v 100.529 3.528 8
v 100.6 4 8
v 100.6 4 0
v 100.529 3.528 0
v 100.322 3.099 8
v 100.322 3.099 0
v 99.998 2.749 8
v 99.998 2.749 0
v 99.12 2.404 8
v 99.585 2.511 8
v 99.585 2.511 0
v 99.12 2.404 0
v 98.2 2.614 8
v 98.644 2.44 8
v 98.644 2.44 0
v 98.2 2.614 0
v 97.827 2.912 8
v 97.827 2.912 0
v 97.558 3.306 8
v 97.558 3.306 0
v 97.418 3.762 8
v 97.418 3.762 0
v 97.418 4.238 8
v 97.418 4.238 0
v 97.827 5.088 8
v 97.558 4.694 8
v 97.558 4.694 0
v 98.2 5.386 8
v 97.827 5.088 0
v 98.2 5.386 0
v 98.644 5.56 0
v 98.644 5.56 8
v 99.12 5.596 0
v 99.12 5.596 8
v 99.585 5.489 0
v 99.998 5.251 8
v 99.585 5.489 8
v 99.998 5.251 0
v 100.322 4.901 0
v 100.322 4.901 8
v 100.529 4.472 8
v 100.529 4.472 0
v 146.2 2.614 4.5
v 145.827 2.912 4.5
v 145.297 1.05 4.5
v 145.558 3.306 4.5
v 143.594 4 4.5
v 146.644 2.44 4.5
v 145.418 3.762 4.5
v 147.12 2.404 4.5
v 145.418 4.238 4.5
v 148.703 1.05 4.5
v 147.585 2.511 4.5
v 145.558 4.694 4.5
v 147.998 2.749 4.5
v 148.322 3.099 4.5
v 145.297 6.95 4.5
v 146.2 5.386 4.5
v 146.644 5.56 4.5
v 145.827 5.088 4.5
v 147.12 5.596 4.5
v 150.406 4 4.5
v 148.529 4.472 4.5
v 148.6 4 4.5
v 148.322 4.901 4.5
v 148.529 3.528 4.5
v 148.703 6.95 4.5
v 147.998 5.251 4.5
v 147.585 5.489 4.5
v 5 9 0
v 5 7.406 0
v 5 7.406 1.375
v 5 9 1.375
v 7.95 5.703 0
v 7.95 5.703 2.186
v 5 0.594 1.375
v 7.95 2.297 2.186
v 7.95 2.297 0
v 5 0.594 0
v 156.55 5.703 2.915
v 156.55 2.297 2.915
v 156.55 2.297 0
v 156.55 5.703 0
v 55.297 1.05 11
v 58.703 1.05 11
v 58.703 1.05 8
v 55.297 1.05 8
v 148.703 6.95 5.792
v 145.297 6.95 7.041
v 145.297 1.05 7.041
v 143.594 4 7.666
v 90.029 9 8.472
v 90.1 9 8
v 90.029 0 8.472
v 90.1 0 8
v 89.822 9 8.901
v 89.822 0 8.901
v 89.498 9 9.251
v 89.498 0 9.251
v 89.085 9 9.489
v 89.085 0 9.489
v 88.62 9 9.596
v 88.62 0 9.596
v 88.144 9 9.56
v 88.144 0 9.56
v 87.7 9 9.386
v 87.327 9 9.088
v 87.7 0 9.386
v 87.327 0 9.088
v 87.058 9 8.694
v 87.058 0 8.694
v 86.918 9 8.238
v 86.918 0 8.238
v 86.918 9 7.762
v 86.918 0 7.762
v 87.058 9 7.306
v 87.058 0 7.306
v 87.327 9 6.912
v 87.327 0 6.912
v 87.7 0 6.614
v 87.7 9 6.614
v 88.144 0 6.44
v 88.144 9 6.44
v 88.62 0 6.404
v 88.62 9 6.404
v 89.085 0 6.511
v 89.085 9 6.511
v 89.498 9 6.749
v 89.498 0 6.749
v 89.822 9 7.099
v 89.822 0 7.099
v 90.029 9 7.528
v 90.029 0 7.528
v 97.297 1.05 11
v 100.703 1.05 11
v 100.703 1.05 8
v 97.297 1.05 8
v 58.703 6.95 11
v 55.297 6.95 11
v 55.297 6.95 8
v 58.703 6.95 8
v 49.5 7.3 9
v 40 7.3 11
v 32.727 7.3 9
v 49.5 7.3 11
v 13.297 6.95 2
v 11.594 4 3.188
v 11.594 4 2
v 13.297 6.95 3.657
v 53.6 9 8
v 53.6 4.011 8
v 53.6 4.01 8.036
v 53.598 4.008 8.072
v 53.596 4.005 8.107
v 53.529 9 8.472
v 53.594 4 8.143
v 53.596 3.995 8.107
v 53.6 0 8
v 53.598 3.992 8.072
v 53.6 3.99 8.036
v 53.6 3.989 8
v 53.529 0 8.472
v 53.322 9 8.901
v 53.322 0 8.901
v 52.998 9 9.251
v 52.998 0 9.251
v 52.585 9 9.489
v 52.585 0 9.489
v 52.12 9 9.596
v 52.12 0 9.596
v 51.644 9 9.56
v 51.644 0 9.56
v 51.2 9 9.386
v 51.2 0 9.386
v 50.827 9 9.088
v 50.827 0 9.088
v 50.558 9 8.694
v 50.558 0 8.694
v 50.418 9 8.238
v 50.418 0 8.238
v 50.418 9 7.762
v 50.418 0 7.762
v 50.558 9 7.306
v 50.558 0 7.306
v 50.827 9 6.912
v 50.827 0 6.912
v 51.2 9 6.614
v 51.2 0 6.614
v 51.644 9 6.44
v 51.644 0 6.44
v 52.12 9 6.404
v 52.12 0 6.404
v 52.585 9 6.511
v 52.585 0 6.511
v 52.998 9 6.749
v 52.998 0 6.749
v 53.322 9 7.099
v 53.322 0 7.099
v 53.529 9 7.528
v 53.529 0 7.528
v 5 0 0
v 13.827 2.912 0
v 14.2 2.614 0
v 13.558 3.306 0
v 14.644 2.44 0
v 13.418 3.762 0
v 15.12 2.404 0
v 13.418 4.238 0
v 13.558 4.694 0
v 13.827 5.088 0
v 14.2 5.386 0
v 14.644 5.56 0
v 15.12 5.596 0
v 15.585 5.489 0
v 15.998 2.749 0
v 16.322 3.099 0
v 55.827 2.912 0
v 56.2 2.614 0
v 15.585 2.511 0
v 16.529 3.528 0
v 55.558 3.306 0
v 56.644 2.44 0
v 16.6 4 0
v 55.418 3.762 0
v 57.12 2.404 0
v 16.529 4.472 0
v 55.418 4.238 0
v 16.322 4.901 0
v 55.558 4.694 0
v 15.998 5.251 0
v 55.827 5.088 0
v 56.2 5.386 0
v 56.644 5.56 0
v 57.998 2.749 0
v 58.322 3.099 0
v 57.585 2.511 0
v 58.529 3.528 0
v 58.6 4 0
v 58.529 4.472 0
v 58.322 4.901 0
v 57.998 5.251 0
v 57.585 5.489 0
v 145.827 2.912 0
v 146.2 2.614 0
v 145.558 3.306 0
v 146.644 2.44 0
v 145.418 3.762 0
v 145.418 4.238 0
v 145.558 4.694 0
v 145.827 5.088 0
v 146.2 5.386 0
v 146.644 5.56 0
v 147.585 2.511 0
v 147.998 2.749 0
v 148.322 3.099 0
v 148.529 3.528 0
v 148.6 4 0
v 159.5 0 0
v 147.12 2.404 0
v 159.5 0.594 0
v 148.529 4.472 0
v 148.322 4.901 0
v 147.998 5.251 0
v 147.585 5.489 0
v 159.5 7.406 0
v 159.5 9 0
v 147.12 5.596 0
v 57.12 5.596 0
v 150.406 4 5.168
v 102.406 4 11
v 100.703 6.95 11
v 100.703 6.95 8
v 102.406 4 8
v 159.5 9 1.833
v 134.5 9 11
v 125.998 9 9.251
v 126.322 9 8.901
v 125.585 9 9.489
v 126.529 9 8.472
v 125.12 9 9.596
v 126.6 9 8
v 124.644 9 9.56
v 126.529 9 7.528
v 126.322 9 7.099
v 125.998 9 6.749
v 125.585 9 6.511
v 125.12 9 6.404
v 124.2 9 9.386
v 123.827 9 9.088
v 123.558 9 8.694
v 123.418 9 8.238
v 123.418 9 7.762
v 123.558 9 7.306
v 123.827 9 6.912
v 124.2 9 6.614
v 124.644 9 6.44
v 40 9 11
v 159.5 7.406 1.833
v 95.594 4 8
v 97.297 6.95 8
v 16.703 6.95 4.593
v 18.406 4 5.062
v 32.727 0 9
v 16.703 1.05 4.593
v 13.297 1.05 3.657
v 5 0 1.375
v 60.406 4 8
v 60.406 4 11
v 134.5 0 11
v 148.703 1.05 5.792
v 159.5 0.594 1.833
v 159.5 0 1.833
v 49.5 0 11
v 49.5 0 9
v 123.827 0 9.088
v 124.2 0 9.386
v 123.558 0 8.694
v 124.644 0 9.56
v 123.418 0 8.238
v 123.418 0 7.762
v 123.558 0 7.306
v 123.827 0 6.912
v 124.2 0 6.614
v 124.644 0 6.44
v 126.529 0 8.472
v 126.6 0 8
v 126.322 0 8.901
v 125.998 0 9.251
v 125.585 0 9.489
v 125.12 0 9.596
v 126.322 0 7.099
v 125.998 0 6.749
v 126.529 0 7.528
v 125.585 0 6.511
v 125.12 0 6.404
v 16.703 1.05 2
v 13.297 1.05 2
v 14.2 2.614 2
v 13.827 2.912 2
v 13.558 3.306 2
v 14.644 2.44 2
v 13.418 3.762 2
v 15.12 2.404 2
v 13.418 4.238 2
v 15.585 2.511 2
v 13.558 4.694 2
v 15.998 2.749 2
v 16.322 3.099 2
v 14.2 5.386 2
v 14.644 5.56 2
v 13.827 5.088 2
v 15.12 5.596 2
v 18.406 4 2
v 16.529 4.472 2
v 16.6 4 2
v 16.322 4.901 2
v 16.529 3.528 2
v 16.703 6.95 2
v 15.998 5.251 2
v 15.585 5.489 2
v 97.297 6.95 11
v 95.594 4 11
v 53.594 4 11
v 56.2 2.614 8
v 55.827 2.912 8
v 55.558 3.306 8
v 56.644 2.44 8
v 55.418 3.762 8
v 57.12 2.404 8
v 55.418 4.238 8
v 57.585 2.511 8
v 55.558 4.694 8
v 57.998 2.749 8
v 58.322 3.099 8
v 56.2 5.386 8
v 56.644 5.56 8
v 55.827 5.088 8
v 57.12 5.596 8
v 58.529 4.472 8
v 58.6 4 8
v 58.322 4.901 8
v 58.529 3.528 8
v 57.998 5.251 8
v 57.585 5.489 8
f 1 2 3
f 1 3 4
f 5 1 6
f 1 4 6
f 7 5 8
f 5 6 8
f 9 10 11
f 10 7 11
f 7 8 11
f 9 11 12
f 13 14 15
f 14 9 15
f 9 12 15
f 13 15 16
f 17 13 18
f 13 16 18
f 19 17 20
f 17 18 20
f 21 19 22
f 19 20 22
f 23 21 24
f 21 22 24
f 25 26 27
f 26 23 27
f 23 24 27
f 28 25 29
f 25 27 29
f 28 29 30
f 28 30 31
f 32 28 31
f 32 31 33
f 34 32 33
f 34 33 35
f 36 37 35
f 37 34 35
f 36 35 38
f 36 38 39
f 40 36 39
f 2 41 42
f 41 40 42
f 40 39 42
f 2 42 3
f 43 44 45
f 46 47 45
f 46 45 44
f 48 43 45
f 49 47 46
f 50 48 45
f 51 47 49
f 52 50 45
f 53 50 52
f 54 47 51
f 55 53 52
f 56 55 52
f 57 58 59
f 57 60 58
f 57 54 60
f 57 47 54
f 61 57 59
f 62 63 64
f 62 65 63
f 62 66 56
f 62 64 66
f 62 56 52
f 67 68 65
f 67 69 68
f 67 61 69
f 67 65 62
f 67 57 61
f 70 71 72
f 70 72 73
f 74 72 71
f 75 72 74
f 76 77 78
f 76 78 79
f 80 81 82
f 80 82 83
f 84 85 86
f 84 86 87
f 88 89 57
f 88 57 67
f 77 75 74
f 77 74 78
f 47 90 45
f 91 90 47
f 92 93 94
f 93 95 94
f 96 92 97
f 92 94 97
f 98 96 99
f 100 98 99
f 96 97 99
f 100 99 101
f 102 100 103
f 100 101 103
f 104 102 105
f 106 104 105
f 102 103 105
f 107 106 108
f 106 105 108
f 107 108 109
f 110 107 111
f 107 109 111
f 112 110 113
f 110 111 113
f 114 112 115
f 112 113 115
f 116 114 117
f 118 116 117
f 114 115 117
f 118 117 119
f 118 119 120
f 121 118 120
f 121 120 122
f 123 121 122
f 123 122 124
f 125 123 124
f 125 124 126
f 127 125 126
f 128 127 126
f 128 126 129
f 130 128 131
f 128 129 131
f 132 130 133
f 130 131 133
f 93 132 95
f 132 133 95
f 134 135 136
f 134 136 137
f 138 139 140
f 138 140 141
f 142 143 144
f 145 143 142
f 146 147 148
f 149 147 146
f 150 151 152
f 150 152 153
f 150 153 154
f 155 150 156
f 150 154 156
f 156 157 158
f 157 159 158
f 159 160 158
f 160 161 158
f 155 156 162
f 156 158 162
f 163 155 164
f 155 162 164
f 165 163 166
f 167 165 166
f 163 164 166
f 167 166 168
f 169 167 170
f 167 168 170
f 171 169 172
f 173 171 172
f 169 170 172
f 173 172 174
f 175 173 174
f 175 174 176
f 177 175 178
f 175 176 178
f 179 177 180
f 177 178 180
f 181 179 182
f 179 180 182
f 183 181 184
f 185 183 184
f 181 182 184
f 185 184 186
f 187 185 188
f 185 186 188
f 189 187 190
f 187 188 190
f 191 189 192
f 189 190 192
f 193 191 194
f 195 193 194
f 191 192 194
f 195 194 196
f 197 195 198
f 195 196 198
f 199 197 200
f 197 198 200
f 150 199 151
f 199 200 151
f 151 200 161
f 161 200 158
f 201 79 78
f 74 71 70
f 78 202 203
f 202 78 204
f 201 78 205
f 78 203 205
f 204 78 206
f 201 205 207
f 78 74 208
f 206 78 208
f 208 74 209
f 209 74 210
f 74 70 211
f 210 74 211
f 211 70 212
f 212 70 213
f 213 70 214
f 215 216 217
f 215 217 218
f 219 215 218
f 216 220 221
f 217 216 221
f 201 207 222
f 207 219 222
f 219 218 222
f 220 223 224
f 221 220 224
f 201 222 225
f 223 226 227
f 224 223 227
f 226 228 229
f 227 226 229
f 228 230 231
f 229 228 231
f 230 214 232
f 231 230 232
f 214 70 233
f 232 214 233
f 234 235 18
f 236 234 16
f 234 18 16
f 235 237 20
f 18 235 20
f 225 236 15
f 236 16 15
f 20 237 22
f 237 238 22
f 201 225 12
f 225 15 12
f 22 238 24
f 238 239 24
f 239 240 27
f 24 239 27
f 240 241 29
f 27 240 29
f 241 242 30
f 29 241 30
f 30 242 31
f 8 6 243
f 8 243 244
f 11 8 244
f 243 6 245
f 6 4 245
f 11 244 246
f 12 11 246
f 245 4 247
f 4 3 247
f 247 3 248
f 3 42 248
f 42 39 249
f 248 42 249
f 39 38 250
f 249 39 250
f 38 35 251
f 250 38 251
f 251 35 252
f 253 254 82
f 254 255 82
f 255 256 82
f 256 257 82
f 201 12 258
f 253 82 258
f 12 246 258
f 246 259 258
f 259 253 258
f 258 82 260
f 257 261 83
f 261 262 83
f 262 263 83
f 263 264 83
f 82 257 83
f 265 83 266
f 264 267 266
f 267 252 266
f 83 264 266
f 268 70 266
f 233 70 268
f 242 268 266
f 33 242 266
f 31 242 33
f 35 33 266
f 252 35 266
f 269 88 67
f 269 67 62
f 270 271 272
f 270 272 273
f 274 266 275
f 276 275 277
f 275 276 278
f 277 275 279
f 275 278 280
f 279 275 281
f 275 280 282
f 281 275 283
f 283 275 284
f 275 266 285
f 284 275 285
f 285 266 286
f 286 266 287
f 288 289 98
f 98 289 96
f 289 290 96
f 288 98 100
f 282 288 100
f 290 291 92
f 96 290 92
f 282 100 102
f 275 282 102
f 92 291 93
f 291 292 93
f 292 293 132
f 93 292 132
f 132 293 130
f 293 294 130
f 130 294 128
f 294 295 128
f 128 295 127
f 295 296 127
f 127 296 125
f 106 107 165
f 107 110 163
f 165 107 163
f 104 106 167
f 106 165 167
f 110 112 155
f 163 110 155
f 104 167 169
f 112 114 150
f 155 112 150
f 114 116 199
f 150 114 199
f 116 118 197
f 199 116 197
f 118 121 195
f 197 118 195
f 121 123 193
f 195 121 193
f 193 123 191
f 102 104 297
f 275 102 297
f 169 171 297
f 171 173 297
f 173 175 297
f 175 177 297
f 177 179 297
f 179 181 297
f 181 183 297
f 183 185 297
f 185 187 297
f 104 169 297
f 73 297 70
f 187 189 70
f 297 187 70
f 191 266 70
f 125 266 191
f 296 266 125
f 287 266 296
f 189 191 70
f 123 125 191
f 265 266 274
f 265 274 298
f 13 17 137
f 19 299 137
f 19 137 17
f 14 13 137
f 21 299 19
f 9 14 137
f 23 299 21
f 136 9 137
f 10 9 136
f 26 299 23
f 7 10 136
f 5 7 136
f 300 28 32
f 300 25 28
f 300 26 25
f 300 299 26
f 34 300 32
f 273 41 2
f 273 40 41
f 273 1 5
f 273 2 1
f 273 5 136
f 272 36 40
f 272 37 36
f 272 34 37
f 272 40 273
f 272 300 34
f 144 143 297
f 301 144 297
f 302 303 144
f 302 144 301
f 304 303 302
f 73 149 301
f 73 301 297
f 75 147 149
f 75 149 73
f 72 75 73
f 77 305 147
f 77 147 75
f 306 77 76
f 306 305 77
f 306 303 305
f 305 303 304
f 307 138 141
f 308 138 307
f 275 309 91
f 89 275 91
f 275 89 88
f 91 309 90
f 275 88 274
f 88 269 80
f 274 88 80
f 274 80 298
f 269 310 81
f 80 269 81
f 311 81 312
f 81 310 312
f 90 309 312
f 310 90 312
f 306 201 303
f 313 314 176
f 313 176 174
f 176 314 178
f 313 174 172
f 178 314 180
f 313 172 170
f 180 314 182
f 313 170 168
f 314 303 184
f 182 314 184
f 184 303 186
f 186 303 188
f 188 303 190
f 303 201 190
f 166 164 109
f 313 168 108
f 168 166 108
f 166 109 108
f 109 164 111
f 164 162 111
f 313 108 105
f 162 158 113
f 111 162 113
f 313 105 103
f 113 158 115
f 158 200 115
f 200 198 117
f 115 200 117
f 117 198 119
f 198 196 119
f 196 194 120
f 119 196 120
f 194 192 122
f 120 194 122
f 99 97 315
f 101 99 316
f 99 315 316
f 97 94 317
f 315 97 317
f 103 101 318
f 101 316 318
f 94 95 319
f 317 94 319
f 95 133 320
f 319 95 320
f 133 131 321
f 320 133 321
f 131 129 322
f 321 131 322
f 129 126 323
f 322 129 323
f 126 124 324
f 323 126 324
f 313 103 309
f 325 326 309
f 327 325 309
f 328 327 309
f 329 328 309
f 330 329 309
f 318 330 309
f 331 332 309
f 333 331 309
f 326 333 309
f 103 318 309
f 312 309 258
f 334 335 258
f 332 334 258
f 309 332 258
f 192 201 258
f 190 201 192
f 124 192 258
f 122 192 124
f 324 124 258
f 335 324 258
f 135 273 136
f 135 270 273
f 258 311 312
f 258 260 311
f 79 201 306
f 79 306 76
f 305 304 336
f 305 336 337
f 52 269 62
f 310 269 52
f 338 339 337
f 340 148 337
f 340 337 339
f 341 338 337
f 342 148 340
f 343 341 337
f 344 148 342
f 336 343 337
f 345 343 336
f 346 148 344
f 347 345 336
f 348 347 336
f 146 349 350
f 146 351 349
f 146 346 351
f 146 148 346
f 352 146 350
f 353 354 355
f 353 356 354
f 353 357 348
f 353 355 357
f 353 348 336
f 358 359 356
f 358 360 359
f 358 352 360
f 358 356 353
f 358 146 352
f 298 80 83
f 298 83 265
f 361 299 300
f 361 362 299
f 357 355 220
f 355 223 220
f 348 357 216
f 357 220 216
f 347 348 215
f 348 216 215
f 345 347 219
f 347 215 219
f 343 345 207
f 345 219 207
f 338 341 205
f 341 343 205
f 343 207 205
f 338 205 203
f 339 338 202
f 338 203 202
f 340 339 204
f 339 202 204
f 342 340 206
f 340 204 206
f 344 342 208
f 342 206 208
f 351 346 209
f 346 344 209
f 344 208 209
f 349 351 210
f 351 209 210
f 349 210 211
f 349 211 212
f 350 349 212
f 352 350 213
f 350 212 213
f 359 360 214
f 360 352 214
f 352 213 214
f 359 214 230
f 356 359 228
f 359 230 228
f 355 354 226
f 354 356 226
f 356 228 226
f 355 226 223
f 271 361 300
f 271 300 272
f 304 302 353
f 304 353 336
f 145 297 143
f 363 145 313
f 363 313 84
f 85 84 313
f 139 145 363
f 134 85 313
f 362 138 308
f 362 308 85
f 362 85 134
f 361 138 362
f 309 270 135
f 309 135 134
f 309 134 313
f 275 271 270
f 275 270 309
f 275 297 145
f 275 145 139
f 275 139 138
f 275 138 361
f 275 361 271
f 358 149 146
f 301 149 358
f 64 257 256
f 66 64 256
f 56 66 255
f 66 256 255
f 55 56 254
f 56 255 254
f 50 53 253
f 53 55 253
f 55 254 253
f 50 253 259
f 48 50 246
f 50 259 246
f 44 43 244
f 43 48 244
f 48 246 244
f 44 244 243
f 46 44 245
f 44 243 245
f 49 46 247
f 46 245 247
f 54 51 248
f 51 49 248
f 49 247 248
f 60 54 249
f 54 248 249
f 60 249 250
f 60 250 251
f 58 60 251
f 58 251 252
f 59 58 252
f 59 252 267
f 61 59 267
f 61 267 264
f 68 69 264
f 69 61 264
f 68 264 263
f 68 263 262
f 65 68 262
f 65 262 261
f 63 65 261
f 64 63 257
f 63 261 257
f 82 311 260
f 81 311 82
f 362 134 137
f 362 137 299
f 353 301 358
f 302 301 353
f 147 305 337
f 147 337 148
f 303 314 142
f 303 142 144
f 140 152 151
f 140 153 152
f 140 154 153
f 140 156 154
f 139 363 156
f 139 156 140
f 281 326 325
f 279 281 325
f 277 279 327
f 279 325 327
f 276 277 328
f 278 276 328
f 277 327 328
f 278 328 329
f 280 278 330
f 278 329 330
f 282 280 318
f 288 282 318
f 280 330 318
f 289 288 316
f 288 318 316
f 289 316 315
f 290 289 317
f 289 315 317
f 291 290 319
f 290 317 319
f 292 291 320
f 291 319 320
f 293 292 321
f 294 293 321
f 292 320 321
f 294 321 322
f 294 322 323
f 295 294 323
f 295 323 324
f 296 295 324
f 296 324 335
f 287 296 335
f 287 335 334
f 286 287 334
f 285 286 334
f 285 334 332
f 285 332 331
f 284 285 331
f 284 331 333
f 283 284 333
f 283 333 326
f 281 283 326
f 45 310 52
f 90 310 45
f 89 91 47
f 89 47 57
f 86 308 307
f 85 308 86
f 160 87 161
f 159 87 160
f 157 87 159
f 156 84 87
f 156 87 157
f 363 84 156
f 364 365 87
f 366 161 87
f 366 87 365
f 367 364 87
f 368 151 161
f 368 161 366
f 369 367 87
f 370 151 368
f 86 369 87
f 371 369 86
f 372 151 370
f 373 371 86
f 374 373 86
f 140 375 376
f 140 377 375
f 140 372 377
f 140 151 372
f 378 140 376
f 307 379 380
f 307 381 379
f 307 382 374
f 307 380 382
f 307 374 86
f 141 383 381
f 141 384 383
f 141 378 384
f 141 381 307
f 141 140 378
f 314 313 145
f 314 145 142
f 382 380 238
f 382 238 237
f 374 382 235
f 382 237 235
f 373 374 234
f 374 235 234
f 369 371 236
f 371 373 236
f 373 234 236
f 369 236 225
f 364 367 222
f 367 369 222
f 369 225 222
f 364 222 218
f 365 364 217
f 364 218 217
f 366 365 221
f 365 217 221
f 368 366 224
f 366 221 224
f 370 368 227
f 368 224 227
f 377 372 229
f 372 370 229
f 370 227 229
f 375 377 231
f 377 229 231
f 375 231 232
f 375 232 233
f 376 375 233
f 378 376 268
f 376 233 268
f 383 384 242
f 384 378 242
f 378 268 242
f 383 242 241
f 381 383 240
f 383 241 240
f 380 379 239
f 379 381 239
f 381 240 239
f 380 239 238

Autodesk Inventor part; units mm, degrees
ref_plane "YZ Plane" through (0, 0, 0) normal (1, 0, 0) x (0, 1, 0)
ref_plane "XZ Plane" through (0, 0, 0) normal (0, 1, 0) x (-1, 0, 0)
ref_plane "XY Plane" through (0, 0, 0) normal (0, 0, 1) x (1, 0, 0)
sketch "Sketch1" plane through (0, 0, 0) normal (0, 0, 1) x (1, 0, 0)
  line L0 (0, 0) -> (164.5, 0)
  line L1 (164.5, 0) -> (164.5, 9)
  line L2 (164.5, 9) -> (0, 9)
  line L3 (0, 9) -> (0, 0)
  circle A0 centre (57, 4) radius 1.6
  circle A1 centre (99, 4) radius 1.6
  circle A2 centre (159.5, 4) radius 1.6
  circle A3 centre (147, 4) radius 1.6
  circle A4 centre (15, 4) radius 1.6
  circle A5 centre (5, 4) radius 1.6
  dimension "d1" = 9
  dimension "d2" = 90
  dimension "d4" = 3.2
  dimension "d6" = 3.2
  dimension "d7" = 3.2
  dimension "d8" = 42
  dimension "d9" = 60.5
  dimension "d26" = 3.2
  dimension "d27" = 48
  dimension "d28" = 3.2
  dimension "d29" = 42
  dimension "d32" = 15
  dimension "d33" = 5
  dimension "d61" = 3.2
  dimension "d62" = 10
  dimension "d63" = 12.5
  dimension "d108" = 4
  dimension "d109" = 4
  dimension "d110" = 4
  dimension "d111" = 4
  dimension "d112" = 4
  dimension "d113" = 4
ref_plane "Work Plane2" through (0, 0, 0) normal (0, -1, 0) x (1, 0, 0)
sketch "Sketch2" plane through (0, 0, 0) normal (0, -1, 0) x (1, 0, 0)
  circle A0 centre (52, 8) radius 1.6
  circle A1 centre (125, 8) radius 1.6
  circle A2 centre (88.5, 8) radius 1.6
  point P0 (0, 0)
  point P1 (52, 0)
  dimension "d13" = 3.2
  dimension "d15" = 3.2
  dimension "d17" = 3.2
  dimension "d18" = 36.5
  dimension "d64" = 52
  dimension "d65" = 36.5
  dimension "d114" = 8
  dimension "d115" = 73
ref_plane "Work Plane1" through (0, 0, 11) normal (0, 0, 1) x (1, 0, 0)
extrude "klocek" add sketch "Sketch1" along normal blind 11
ref_plane "Work Plane3" through (0, 0, 0) normal (0, -1, 0) x (1, 0, 0)
extrude "prowadzenie osi" cut sketch "Sketch2" against normal up to next
ref_plane "Work Plane4" through (0, 0, 0) normal (0, -1, 0) x (1, 0, 0)
sketch "Sketch7" plane through (0, 0, 0) normal (0, -1, 0) x (1, 0, 0)
  line L0 (0, 11) -> (0, 0)
  line L1 (0, 11) -> (164.5, 11) projected
  line L2 (0, 11) -> (40, 11)
  line L3 (40, 11) -> (0, 0)
  point P0 (0, -1.8333)
  dimension "d86" = 11
  dimension "d87" = 40
sketch "Sketch8" plane through (0, 0, 0) normal (0, -1, 0) x (1, 0, 0)
  line L0 (164.5, 0) -> (164.5, 11) projected
  line L1 (164.5, 11) -> (164.5, 0)
  line L2 (164.5, 11) -> (0, 11) projected
  line L3 (164.5, 11) -> (134.5, 11)
  line L4 (134.5, 11) -> (164.5, 0)
  point P0 (0, 0)
  point P1 (40.8333, 11)
  dimension "d80" = 11
  dimension "d81" = 30
extrude "przedni skos" cut sketch "Sketch7" against normal up to next
extrude "tylni skos" cut sketch "Sketch8" against normal up to next
ref_plane "Work Plane7" through (0, 0, 11) normal (0, 0, 1) x (1, 0, 0)
sketch "Sketch5" plane through (0, 0, 11) normal (0, 0, 1) x (1, 0, 0)
  circle A0 centre (99, 4) radius 1.6 projected
  line L0 (95.5936, 4) -> (97.2968, 6.95)
  line L1 (97.2968, 6.95) -> (100.7032, 6.95)
  line L2 (100.7032, 6.95) -> (102.4064, 4)
  line L3 (102.4064, 4) -> (100.7032, 1.05)
  line L4 (100.7032, 1.05) -> (97.2968, 1.05)
  line L5 (97.2968, 1.05) -> (95.5936, 4)
  circle A1 centre (57, 4) radius 1.6 projected
  line L6 (60.4064, 4) -> (58.7032, 1.05)
  line L7 (58.7032, 1.05) -> (55.2968, 1.05)
  line L8 (55.2968, 1.05) -> (53.5936, 4)
  line L9 (53.5936, 4) -> (55.2968, 6.95)
  line L10 (55.2968, 6.95) -> (58.7032, 6.95)
  line L11 (58.7032, 6.95) -> (60.4064, 4)
  point P0 (119.5, 5)
  dimension "d98" = 5.9
  dimension "d100" = 5.9
extrude "hex insert middle" cut sketch "Sketch5" against normal blind 3
ref_plane "Work Plane6" through (0, 0, 11) normal (0, 0, 1) x (1, 0, 0)
sketch "Sketch9" plane through (0, 0, 11) normal (0, 0, 1) x (1, 0, 0)
  circle A0 centre (147, 4) radius 1.6 projected
  line L0 (150.4064, 4) -> (148.7032, 1.05)
  line L1 (148.7032, 1.05) -> (145.2968, 1.05)
  line L2 (145.2968, 1.05) -> (143.5936, 4)
  line L3 (143.5936, 4) -> (145.2968, 6.95)
  line L4 (145.2968, 6.95) -> (148.7032, 6.95)
  line L5 (148.7032, 6.95) -> (150.4064, 4)
  point P0 (0, 0)
  point P1 (153, 5)
  dimension "d99" = 5.9
extrude "hex insert rear 1" cut sketch "Sketch9" against normal blind 6.5
ref_plane "Work Plane5" through (0, 0, 11) normal (0, 0, 1) x (1, 0, 0)
sketch "Sketch10" plane through (0, 0, 11) normal (0, 0, 1) x (1, 0, 0)
  circle A0 centre (159.5, 4) radius 1.6 projected
  line L0 (162.45, 5.7032) -> (162.45, 2.2968)
  line L1 (162.45, 2.2968) -> (159.5, 0.5936)
  line L2 (159.5, 0.5936) -> (156.55, 2.2968)
  line L3 (156.55, 2.2968) -> (156.55, 5.7032)
  line L4 (156.55, 5.7032) -> (159.5, 7.4064)
  line L5 (159.5, 7.4064) -> (162.45, 5.7032)
  line L6 (164.5, 0) -> (134.5, 0) projected
  point P0 (0, 0)
  dimension "d118" = 5.9
extrude "hex insert rear 2" cut sketch "Sketch10" against normal up to next contours A0 | L0 L1 L2 L3 L4 L5
sketch "Sketch13" plane through (0, 0, 11) normal (0, 0, 1) x (1, 0, 0)
  line L0 (197.4, 0) -> (-32.9, 0) projected
  line L1 (7.95, 2.2968) -> (5, 0.5936)
  line L2 (5, 0.5936) -> (2.05, 2.2968)
  line L3 (2.05, 2.2968) -> (2.05, 5.7032)
  line L4 (2.05, 5.7032) -> (5, 7.4064)
  line L5 (5, 7.4064) -> (7.95, 5.7032)
  line L6 (7.95, 5.7032) -> (7.95, 2.2968)
  point P0 (0, 0)
  point P1 (5, 4)
  point P2 (5, 4)
  dimension "d117" = 5.9
extrude "hex insert front 1" cut sketch "Sketch13" against normal through all
sketch "Sketch16" plane through (0, 0, 11) normal (0, 0, 1) x (1, 0, 0)
  circle A0 centre (15, 4) radius 1.6 projected
  line L0 (18.4064, 4) -> (16.7032, 1.05)
  line L1 (16.7032, 1.05) -> (13.2968, 1.05)
  line L2 (13.2968, 1.05) -> (11.5936, 4)
  line L3 (11.5936, 4) -> (13.2968, 6.95)
  line L4 (13.2968, 6.95) -> (16.7032, 6.95)
  line L5 (16.7032, 6.95) -> (18.4064, 4)
  point P0 (0, 0)
  dimension "d93" = 5.9
extrude "hex insert front 2" cut sketch "Sketch16" against normal blind 9
sketch "Sketch17" plane through (0, 0, 0) normal (0, 0, -1) x (-1, 0, 0)
  line L0 (0, 9) -> (0, 0) projected
  line L1 (0, 0) -> (-5, 0)
  line L2 (-5, 0) -> (-5, 10.0042)
  line L3 (-5, 10.0042) -> (0, 10.0042)
  line L4 (0, 10.0042) -> (0, 0)
  point P0 (-5, 7.4064)
extrude "ciecie przod" cut sketch "Sketch17" against normal up to next
sketch "Sketch18" plane through (40, 0, 11) normal (0, -1, 0) x (1, 0, 0)
  line L0 (9.5, 0) -> (9.5, -2)
  line L1 (9.5, -2) -> (-7.5, -2)
  line L2 (-7.5, -2) -> (-7.5, 0)
  line L3 (-7.5, 0) -> (9.5, 0)
  line L4 (94.5, 0) -> (0, 0) projected
  circle A0 centre (12, -3) radius 1.6 projected
  line L5 (-35, -11) -> (124.5, -11) projected
  point P0 (-40, -11)
  dimension "d102" = 2
  dimension "d103" = 17
  dimension "d104" = 2.5
extrude "sensor linii" cut sketch "Sketch18" against normal blind 7.3 contours L0 L1 L2 L3
sketch "Sketch21" plane through (0, 0, 0) normal (0, 0, -1) x (-1, 0, 0)
  line L0 (-159.5, 8.9293) -> (-159.5, 0)
  line L1 (-164.5, 0) -> (-134.5, 0) projected
  line L2 (-159.5, 0) -> (-164.5, 0)
  line L3 (-164.5, 0) -> (-164.5, 9)
  line L4 (-164.5, 9) -> (-159.5, 9)
  line L5 (-159.5, 9) -> (-159.5, 8.9293)
  line L6 (-134.5, 9) -> (-164.5, 9) projected
  line L7 (-164.5, 9) -> (-164.5, 0) projected
  point P0 (0, 0)
extrude "ciecie tyl" cut sketch "Sketch21" against normal up to next
properties part number "wheel_support_v4_narrow_with_line_sensor_all_holes"
